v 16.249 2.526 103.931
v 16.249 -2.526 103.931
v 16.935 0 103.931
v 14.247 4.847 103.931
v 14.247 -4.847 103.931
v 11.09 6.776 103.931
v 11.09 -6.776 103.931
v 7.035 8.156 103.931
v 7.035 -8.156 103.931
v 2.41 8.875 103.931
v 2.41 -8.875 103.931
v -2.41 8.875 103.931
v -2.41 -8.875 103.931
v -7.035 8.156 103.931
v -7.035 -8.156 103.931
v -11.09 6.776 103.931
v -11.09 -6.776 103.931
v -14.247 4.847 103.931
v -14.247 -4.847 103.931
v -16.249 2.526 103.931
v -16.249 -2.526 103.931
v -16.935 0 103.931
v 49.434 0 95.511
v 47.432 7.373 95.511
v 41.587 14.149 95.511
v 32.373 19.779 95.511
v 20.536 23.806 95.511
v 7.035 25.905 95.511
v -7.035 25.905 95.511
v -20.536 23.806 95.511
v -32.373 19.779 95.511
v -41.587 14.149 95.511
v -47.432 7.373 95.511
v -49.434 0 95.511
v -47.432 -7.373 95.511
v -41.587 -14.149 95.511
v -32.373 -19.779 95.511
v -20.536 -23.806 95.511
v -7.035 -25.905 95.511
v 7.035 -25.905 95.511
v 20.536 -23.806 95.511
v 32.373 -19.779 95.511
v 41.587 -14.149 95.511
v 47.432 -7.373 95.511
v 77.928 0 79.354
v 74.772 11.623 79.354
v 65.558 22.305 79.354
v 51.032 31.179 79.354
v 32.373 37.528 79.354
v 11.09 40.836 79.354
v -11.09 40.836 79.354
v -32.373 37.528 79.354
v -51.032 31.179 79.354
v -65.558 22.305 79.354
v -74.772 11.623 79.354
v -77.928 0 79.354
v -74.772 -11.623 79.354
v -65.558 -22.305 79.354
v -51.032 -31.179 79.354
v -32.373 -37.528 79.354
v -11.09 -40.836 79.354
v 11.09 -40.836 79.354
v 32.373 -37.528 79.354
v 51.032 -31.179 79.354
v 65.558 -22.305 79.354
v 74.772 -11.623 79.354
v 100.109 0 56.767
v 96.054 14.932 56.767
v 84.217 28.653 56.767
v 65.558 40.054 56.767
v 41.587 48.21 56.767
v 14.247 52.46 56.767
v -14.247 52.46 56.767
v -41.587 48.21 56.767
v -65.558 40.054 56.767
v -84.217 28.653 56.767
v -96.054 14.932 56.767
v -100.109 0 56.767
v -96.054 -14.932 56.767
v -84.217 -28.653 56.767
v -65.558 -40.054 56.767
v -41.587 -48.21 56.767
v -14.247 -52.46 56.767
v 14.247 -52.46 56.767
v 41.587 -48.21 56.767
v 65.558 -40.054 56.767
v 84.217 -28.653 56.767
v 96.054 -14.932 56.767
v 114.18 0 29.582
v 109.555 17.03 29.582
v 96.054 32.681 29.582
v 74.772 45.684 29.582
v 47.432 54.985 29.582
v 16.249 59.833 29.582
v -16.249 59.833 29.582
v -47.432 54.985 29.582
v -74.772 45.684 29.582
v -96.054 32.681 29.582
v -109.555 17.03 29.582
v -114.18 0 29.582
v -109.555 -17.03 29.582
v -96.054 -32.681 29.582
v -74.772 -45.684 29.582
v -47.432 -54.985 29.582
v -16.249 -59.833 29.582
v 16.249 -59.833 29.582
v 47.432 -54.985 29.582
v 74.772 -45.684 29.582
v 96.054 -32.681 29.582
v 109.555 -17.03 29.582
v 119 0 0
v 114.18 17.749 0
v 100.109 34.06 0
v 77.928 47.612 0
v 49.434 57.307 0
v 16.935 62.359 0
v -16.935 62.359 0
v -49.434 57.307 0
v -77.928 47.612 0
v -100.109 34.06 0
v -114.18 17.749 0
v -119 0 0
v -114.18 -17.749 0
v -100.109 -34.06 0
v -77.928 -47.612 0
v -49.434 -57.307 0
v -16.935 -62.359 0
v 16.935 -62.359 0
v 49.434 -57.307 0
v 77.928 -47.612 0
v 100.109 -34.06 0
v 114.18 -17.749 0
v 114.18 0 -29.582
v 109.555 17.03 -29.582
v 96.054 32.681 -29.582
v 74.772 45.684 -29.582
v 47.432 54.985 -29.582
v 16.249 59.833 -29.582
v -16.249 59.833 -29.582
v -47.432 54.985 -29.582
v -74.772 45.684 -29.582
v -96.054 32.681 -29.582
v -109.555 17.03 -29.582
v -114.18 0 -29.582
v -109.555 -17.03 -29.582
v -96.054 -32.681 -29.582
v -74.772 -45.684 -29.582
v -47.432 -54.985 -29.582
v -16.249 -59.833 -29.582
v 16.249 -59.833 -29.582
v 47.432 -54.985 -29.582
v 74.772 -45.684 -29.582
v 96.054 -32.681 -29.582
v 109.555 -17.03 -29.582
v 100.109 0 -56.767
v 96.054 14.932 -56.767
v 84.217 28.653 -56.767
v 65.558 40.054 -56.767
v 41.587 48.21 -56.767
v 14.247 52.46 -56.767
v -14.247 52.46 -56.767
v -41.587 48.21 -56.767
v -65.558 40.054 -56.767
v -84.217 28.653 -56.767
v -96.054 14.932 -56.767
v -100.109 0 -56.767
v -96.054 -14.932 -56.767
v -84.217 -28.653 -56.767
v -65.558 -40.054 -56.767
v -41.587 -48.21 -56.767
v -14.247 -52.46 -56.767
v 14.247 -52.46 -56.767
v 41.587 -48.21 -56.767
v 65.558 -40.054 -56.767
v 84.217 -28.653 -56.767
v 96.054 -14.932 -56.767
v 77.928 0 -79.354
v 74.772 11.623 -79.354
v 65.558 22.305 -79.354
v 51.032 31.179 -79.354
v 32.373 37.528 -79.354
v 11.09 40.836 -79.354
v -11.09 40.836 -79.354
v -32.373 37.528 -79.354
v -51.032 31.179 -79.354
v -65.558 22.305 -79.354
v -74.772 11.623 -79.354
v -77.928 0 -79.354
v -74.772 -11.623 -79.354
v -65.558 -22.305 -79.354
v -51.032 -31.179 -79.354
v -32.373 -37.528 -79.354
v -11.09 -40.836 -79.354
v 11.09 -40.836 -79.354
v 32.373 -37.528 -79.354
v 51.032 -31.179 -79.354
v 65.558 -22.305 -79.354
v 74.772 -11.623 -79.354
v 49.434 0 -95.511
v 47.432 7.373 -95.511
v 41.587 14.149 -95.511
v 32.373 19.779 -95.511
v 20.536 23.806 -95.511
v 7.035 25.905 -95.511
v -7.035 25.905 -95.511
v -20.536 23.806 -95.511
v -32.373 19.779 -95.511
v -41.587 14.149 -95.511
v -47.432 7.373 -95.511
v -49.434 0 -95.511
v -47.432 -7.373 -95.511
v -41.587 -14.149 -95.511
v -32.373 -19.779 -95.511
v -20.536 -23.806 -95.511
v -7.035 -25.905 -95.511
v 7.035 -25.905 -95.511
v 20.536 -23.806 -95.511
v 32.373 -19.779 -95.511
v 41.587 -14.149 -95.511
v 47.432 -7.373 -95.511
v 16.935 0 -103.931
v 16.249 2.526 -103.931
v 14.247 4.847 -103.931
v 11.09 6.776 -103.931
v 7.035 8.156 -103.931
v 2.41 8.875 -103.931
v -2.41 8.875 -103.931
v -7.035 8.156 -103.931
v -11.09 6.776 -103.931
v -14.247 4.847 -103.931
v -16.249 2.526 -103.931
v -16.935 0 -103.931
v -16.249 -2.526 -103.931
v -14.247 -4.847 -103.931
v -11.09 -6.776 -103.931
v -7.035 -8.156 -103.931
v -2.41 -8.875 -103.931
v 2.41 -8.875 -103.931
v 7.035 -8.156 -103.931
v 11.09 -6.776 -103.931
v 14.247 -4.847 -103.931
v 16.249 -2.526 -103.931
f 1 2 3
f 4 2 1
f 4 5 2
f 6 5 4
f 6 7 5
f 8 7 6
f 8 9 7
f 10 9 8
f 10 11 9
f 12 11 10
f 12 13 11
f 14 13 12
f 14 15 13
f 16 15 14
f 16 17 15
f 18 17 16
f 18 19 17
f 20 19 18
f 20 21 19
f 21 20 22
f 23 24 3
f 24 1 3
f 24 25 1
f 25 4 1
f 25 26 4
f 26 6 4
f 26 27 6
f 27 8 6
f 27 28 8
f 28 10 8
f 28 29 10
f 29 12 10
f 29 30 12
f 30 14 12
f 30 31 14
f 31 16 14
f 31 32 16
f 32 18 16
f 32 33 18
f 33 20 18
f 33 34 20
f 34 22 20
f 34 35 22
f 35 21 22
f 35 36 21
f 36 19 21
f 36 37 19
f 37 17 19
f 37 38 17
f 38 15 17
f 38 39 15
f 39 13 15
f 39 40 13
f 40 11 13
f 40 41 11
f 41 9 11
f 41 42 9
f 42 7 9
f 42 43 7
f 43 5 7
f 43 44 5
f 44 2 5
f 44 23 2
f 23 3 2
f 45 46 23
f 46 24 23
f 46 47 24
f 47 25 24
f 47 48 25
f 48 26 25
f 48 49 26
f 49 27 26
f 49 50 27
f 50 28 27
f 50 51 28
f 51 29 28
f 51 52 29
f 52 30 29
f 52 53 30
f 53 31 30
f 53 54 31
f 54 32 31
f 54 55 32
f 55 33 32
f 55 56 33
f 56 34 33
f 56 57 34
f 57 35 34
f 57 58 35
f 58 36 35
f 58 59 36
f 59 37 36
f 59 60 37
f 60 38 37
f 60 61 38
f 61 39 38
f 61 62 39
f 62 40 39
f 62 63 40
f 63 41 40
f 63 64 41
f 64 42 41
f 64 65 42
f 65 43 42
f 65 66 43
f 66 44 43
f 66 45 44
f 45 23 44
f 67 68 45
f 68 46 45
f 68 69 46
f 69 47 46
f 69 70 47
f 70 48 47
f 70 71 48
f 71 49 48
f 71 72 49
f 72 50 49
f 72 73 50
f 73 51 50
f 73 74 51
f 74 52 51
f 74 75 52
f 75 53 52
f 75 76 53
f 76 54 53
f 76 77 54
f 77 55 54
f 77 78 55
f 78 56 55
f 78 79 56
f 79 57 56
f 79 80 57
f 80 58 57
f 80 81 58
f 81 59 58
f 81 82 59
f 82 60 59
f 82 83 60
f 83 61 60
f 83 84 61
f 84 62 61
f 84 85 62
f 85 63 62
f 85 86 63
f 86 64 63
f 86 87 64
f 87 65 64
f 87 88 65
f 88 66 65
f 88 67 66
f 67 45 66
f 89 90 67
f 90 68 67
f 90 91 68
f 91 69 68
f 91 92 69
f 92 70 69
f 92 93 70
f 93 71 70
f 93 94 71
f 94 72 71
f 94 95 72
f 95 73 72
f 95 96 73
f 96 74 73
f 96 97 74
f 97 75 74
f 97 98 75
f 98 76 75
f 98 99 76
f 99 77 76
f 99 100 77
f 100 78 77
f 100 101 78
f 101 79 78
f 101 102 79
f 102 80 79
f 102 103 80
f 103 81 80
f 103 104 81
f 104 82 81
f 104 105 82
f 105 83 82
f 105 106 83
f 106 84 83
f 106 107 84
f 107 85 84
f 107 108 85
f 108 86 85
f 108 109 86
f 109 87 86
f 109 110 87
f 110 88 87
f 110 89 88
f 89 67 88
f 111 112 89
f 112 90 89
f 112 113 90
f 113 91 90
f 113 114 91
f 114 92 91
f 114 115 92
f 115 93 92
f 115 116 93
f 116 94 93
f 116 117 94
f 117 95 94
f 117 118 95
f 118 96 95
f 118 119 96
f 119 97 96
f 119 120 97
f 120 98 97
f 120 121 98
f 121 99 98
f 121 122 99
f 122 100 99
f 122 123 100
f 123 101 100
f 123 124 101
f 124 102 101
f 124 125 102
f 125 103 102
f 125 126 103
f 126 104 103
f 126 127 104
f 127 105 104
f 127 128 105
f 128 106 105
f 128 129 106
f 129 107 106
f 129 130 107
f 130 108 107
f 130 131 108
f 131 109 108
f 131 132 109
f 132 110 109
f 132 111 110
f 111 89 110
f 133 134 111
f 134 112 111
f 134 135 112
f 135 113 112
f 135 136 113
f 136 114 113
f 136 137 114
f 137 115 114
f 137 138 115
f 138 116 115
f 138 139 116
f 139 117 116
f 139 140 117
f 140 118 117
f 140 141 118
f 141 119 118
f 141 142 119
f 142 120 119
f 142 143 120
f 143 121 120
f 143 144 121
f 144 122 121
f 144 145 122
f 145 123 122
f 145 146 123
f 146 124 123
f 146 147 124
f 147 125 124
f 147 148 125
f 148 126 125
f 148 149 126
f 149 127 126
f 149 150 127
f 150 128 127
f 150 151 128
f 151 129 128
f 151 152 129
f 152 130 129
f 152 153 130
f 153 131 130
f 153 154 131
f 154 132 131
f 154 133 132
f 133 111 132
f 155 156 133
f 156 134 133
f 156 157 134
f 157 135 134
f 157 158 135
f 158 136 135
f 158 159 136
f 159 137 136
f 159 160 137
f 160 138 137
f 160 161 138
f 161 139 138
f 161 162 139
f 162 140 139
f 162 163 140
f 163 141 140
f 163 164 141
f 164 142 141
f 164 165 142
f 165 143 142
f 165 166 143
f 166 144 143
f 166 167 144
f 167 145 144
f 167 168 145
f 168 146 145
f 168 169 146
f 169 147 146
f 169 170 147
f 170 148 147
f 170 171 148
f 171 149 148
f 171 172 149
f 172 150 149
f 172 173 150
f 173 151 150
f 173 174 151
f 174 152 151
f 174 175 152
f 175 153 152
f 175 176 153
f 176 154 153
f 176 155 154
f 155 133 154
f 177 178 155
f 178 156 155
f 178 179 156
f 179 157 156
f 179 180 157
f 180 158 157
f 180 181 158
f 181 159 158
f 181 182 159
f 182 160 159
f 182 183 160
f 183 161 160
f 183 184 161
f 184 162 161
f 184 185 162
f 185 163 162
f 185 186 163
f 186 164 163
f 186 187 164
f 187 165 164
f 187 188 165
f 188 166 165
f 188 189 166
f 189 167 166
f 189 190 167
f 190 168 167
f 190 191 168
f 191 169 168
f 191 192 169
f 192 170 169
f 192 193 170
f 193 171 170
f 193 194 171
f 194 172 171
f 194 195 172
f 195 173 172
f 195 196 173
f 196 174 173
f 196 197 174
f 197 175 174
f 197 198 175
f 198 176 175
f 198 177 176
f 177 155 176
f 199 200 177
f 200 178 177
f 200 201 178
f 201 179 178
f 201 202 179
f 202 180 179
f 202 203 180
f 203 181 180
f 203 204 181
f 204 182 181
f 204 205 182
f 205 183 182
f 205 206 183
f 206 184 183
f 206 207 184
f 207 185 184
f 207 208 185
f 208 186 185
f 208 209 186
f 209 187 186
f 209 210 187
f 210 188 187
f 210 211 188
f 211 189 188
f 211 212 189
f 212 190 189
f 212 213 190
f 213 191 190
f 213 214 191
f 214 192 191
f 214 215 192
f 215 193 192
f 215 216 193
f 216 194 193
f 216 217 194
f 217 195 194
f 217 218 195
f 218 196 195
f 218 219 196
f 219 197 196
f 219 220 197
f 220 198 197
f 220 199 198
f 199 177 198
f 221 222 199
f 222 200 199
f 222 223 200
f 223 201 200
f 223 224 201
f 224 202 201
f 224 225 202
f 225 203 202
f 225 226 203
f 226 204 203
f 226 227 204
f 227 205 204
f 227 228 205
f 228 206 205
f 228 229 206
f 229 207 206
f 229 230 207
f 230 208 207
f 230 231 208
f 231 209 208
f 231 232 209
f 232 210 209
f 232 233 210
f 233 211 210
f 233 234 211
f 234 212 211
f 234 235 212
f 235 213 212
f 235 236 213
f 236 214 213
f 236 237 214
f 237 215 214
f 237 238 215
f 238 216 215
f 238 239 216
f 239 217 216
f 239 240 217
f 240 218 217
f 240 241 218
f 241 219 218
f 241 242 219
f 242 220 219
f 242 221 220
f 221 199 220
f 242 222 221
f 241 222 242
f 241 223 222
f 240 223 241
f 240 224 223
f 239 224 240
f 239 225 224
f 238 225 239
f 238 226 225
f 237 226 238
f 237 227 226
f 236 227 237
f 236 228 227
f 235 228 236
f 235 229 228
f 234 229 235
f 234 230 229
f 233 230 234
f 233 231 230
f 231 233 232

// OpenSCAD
// Generated by SolidPython 1.0.1 on 2020-07-29 00:46:53


scale(v = [17, 9, 15]) {
	sphere(r = 7);
}
/***********************************************
*********      SolidPython code:      **********
************************************************
 
# import packages: SolidPython
from solid import *
from solid.utils import *
from itertools import chain, combinations, permutations


class Resize:

    def __init__(self, scad_file):
        self.scad_file = scad_file
        #self.scad_file = import_scad(scad_file)
        # cone/cylinder param:
        self.r1 = 0
        self.r2 = 0
        self.h = 0
        # rectangular prism param:
        self.w = 0
        self.l = 0
        # ellipse param:
        self.r = 0

    # import OpenScad code (file name corresponds to shape)


    # classify shape + parameters
    def assign(self, param1, param2, param3):
        if self.scad_file == 'cone.scad':
            self.r1 = param1
            self.r2 = param2
            self.h = param3
        elif self.scad_file == 'cylinder.scad':
            self.r1 = param1
            self.r2 = param2
            self.h = param3
        elif self.scad_file == 'rectangularPrism.scad':
            self.h = param1
            self.l = param2
            self.w = param3
        else:
            self.r = param1
            self.h = param2

    # resize parameters
    def iterate(self):
        x = range(3, 20, 2)
        i = 1
        if self.scad_file == 'cone.scad':
            tempList = list(permutations(x, 2))
            for temp in tempList:
                param1 = temp[0]
                param2 = temp[1]
                filepath = 'produced_scad_files/' + 'cone' + str(param1) + '_' + str(param2) + '_' + '.scad'
                scad_render_to_file(cylinder(h=param1, r1=param2, r2=0), filepath)

        elif self.scad_file == 'cylinder.scad':
            tempList = list(permutations(x, 3))
            for temp in tempList:
                param1 = temp[0]
                param2 = temp[1]
                filepath = 'produced_scad_files/' + 'cylinder' + str(param1) + '_' + str(param2) + '_' + '.scad'
                scad_render_to_file(cylinder(h=param1, r1=param2, r2=param2), filepath)

        elif self.scad_file == 'rectangularPrism.scad':
            tempList = list(permutations(x, 3))
            for temp in tempList:
                param1 = temp[0]
                param2 = temp[1]
                param3 = temp[2]
                filepath = 'produced_scad_files/' + 'rectangularPrism' + str(param1) + '_' + str(param2) + '_' + str(
                    param3) + '.scad'
                scad_render_to_file(cube(size=(param1, param2, param3)), filepath)

        elif self.scad_file == 'ellipse.scad':
            tempList = list(permutations(x, 4))
            for temp in tempList:
                param1 = temp[0]
                param2 = temp[1]
                param3 = temp[2]
                param4 = temp[3]
                filepath = 'produced_scad_files/' + 'ellipse' + str(param1) + '_' + str(param2) + '_' + str(param3) + '_' + str(param4) + '.scad'
                scad_render_to_file(scale([param1, param2, param3])(sphere(r=param4)), filepath)

    def render_to_scadfile(self):
        scad_render_to_file(scad, 'example.scad') 
 
************************************************/
